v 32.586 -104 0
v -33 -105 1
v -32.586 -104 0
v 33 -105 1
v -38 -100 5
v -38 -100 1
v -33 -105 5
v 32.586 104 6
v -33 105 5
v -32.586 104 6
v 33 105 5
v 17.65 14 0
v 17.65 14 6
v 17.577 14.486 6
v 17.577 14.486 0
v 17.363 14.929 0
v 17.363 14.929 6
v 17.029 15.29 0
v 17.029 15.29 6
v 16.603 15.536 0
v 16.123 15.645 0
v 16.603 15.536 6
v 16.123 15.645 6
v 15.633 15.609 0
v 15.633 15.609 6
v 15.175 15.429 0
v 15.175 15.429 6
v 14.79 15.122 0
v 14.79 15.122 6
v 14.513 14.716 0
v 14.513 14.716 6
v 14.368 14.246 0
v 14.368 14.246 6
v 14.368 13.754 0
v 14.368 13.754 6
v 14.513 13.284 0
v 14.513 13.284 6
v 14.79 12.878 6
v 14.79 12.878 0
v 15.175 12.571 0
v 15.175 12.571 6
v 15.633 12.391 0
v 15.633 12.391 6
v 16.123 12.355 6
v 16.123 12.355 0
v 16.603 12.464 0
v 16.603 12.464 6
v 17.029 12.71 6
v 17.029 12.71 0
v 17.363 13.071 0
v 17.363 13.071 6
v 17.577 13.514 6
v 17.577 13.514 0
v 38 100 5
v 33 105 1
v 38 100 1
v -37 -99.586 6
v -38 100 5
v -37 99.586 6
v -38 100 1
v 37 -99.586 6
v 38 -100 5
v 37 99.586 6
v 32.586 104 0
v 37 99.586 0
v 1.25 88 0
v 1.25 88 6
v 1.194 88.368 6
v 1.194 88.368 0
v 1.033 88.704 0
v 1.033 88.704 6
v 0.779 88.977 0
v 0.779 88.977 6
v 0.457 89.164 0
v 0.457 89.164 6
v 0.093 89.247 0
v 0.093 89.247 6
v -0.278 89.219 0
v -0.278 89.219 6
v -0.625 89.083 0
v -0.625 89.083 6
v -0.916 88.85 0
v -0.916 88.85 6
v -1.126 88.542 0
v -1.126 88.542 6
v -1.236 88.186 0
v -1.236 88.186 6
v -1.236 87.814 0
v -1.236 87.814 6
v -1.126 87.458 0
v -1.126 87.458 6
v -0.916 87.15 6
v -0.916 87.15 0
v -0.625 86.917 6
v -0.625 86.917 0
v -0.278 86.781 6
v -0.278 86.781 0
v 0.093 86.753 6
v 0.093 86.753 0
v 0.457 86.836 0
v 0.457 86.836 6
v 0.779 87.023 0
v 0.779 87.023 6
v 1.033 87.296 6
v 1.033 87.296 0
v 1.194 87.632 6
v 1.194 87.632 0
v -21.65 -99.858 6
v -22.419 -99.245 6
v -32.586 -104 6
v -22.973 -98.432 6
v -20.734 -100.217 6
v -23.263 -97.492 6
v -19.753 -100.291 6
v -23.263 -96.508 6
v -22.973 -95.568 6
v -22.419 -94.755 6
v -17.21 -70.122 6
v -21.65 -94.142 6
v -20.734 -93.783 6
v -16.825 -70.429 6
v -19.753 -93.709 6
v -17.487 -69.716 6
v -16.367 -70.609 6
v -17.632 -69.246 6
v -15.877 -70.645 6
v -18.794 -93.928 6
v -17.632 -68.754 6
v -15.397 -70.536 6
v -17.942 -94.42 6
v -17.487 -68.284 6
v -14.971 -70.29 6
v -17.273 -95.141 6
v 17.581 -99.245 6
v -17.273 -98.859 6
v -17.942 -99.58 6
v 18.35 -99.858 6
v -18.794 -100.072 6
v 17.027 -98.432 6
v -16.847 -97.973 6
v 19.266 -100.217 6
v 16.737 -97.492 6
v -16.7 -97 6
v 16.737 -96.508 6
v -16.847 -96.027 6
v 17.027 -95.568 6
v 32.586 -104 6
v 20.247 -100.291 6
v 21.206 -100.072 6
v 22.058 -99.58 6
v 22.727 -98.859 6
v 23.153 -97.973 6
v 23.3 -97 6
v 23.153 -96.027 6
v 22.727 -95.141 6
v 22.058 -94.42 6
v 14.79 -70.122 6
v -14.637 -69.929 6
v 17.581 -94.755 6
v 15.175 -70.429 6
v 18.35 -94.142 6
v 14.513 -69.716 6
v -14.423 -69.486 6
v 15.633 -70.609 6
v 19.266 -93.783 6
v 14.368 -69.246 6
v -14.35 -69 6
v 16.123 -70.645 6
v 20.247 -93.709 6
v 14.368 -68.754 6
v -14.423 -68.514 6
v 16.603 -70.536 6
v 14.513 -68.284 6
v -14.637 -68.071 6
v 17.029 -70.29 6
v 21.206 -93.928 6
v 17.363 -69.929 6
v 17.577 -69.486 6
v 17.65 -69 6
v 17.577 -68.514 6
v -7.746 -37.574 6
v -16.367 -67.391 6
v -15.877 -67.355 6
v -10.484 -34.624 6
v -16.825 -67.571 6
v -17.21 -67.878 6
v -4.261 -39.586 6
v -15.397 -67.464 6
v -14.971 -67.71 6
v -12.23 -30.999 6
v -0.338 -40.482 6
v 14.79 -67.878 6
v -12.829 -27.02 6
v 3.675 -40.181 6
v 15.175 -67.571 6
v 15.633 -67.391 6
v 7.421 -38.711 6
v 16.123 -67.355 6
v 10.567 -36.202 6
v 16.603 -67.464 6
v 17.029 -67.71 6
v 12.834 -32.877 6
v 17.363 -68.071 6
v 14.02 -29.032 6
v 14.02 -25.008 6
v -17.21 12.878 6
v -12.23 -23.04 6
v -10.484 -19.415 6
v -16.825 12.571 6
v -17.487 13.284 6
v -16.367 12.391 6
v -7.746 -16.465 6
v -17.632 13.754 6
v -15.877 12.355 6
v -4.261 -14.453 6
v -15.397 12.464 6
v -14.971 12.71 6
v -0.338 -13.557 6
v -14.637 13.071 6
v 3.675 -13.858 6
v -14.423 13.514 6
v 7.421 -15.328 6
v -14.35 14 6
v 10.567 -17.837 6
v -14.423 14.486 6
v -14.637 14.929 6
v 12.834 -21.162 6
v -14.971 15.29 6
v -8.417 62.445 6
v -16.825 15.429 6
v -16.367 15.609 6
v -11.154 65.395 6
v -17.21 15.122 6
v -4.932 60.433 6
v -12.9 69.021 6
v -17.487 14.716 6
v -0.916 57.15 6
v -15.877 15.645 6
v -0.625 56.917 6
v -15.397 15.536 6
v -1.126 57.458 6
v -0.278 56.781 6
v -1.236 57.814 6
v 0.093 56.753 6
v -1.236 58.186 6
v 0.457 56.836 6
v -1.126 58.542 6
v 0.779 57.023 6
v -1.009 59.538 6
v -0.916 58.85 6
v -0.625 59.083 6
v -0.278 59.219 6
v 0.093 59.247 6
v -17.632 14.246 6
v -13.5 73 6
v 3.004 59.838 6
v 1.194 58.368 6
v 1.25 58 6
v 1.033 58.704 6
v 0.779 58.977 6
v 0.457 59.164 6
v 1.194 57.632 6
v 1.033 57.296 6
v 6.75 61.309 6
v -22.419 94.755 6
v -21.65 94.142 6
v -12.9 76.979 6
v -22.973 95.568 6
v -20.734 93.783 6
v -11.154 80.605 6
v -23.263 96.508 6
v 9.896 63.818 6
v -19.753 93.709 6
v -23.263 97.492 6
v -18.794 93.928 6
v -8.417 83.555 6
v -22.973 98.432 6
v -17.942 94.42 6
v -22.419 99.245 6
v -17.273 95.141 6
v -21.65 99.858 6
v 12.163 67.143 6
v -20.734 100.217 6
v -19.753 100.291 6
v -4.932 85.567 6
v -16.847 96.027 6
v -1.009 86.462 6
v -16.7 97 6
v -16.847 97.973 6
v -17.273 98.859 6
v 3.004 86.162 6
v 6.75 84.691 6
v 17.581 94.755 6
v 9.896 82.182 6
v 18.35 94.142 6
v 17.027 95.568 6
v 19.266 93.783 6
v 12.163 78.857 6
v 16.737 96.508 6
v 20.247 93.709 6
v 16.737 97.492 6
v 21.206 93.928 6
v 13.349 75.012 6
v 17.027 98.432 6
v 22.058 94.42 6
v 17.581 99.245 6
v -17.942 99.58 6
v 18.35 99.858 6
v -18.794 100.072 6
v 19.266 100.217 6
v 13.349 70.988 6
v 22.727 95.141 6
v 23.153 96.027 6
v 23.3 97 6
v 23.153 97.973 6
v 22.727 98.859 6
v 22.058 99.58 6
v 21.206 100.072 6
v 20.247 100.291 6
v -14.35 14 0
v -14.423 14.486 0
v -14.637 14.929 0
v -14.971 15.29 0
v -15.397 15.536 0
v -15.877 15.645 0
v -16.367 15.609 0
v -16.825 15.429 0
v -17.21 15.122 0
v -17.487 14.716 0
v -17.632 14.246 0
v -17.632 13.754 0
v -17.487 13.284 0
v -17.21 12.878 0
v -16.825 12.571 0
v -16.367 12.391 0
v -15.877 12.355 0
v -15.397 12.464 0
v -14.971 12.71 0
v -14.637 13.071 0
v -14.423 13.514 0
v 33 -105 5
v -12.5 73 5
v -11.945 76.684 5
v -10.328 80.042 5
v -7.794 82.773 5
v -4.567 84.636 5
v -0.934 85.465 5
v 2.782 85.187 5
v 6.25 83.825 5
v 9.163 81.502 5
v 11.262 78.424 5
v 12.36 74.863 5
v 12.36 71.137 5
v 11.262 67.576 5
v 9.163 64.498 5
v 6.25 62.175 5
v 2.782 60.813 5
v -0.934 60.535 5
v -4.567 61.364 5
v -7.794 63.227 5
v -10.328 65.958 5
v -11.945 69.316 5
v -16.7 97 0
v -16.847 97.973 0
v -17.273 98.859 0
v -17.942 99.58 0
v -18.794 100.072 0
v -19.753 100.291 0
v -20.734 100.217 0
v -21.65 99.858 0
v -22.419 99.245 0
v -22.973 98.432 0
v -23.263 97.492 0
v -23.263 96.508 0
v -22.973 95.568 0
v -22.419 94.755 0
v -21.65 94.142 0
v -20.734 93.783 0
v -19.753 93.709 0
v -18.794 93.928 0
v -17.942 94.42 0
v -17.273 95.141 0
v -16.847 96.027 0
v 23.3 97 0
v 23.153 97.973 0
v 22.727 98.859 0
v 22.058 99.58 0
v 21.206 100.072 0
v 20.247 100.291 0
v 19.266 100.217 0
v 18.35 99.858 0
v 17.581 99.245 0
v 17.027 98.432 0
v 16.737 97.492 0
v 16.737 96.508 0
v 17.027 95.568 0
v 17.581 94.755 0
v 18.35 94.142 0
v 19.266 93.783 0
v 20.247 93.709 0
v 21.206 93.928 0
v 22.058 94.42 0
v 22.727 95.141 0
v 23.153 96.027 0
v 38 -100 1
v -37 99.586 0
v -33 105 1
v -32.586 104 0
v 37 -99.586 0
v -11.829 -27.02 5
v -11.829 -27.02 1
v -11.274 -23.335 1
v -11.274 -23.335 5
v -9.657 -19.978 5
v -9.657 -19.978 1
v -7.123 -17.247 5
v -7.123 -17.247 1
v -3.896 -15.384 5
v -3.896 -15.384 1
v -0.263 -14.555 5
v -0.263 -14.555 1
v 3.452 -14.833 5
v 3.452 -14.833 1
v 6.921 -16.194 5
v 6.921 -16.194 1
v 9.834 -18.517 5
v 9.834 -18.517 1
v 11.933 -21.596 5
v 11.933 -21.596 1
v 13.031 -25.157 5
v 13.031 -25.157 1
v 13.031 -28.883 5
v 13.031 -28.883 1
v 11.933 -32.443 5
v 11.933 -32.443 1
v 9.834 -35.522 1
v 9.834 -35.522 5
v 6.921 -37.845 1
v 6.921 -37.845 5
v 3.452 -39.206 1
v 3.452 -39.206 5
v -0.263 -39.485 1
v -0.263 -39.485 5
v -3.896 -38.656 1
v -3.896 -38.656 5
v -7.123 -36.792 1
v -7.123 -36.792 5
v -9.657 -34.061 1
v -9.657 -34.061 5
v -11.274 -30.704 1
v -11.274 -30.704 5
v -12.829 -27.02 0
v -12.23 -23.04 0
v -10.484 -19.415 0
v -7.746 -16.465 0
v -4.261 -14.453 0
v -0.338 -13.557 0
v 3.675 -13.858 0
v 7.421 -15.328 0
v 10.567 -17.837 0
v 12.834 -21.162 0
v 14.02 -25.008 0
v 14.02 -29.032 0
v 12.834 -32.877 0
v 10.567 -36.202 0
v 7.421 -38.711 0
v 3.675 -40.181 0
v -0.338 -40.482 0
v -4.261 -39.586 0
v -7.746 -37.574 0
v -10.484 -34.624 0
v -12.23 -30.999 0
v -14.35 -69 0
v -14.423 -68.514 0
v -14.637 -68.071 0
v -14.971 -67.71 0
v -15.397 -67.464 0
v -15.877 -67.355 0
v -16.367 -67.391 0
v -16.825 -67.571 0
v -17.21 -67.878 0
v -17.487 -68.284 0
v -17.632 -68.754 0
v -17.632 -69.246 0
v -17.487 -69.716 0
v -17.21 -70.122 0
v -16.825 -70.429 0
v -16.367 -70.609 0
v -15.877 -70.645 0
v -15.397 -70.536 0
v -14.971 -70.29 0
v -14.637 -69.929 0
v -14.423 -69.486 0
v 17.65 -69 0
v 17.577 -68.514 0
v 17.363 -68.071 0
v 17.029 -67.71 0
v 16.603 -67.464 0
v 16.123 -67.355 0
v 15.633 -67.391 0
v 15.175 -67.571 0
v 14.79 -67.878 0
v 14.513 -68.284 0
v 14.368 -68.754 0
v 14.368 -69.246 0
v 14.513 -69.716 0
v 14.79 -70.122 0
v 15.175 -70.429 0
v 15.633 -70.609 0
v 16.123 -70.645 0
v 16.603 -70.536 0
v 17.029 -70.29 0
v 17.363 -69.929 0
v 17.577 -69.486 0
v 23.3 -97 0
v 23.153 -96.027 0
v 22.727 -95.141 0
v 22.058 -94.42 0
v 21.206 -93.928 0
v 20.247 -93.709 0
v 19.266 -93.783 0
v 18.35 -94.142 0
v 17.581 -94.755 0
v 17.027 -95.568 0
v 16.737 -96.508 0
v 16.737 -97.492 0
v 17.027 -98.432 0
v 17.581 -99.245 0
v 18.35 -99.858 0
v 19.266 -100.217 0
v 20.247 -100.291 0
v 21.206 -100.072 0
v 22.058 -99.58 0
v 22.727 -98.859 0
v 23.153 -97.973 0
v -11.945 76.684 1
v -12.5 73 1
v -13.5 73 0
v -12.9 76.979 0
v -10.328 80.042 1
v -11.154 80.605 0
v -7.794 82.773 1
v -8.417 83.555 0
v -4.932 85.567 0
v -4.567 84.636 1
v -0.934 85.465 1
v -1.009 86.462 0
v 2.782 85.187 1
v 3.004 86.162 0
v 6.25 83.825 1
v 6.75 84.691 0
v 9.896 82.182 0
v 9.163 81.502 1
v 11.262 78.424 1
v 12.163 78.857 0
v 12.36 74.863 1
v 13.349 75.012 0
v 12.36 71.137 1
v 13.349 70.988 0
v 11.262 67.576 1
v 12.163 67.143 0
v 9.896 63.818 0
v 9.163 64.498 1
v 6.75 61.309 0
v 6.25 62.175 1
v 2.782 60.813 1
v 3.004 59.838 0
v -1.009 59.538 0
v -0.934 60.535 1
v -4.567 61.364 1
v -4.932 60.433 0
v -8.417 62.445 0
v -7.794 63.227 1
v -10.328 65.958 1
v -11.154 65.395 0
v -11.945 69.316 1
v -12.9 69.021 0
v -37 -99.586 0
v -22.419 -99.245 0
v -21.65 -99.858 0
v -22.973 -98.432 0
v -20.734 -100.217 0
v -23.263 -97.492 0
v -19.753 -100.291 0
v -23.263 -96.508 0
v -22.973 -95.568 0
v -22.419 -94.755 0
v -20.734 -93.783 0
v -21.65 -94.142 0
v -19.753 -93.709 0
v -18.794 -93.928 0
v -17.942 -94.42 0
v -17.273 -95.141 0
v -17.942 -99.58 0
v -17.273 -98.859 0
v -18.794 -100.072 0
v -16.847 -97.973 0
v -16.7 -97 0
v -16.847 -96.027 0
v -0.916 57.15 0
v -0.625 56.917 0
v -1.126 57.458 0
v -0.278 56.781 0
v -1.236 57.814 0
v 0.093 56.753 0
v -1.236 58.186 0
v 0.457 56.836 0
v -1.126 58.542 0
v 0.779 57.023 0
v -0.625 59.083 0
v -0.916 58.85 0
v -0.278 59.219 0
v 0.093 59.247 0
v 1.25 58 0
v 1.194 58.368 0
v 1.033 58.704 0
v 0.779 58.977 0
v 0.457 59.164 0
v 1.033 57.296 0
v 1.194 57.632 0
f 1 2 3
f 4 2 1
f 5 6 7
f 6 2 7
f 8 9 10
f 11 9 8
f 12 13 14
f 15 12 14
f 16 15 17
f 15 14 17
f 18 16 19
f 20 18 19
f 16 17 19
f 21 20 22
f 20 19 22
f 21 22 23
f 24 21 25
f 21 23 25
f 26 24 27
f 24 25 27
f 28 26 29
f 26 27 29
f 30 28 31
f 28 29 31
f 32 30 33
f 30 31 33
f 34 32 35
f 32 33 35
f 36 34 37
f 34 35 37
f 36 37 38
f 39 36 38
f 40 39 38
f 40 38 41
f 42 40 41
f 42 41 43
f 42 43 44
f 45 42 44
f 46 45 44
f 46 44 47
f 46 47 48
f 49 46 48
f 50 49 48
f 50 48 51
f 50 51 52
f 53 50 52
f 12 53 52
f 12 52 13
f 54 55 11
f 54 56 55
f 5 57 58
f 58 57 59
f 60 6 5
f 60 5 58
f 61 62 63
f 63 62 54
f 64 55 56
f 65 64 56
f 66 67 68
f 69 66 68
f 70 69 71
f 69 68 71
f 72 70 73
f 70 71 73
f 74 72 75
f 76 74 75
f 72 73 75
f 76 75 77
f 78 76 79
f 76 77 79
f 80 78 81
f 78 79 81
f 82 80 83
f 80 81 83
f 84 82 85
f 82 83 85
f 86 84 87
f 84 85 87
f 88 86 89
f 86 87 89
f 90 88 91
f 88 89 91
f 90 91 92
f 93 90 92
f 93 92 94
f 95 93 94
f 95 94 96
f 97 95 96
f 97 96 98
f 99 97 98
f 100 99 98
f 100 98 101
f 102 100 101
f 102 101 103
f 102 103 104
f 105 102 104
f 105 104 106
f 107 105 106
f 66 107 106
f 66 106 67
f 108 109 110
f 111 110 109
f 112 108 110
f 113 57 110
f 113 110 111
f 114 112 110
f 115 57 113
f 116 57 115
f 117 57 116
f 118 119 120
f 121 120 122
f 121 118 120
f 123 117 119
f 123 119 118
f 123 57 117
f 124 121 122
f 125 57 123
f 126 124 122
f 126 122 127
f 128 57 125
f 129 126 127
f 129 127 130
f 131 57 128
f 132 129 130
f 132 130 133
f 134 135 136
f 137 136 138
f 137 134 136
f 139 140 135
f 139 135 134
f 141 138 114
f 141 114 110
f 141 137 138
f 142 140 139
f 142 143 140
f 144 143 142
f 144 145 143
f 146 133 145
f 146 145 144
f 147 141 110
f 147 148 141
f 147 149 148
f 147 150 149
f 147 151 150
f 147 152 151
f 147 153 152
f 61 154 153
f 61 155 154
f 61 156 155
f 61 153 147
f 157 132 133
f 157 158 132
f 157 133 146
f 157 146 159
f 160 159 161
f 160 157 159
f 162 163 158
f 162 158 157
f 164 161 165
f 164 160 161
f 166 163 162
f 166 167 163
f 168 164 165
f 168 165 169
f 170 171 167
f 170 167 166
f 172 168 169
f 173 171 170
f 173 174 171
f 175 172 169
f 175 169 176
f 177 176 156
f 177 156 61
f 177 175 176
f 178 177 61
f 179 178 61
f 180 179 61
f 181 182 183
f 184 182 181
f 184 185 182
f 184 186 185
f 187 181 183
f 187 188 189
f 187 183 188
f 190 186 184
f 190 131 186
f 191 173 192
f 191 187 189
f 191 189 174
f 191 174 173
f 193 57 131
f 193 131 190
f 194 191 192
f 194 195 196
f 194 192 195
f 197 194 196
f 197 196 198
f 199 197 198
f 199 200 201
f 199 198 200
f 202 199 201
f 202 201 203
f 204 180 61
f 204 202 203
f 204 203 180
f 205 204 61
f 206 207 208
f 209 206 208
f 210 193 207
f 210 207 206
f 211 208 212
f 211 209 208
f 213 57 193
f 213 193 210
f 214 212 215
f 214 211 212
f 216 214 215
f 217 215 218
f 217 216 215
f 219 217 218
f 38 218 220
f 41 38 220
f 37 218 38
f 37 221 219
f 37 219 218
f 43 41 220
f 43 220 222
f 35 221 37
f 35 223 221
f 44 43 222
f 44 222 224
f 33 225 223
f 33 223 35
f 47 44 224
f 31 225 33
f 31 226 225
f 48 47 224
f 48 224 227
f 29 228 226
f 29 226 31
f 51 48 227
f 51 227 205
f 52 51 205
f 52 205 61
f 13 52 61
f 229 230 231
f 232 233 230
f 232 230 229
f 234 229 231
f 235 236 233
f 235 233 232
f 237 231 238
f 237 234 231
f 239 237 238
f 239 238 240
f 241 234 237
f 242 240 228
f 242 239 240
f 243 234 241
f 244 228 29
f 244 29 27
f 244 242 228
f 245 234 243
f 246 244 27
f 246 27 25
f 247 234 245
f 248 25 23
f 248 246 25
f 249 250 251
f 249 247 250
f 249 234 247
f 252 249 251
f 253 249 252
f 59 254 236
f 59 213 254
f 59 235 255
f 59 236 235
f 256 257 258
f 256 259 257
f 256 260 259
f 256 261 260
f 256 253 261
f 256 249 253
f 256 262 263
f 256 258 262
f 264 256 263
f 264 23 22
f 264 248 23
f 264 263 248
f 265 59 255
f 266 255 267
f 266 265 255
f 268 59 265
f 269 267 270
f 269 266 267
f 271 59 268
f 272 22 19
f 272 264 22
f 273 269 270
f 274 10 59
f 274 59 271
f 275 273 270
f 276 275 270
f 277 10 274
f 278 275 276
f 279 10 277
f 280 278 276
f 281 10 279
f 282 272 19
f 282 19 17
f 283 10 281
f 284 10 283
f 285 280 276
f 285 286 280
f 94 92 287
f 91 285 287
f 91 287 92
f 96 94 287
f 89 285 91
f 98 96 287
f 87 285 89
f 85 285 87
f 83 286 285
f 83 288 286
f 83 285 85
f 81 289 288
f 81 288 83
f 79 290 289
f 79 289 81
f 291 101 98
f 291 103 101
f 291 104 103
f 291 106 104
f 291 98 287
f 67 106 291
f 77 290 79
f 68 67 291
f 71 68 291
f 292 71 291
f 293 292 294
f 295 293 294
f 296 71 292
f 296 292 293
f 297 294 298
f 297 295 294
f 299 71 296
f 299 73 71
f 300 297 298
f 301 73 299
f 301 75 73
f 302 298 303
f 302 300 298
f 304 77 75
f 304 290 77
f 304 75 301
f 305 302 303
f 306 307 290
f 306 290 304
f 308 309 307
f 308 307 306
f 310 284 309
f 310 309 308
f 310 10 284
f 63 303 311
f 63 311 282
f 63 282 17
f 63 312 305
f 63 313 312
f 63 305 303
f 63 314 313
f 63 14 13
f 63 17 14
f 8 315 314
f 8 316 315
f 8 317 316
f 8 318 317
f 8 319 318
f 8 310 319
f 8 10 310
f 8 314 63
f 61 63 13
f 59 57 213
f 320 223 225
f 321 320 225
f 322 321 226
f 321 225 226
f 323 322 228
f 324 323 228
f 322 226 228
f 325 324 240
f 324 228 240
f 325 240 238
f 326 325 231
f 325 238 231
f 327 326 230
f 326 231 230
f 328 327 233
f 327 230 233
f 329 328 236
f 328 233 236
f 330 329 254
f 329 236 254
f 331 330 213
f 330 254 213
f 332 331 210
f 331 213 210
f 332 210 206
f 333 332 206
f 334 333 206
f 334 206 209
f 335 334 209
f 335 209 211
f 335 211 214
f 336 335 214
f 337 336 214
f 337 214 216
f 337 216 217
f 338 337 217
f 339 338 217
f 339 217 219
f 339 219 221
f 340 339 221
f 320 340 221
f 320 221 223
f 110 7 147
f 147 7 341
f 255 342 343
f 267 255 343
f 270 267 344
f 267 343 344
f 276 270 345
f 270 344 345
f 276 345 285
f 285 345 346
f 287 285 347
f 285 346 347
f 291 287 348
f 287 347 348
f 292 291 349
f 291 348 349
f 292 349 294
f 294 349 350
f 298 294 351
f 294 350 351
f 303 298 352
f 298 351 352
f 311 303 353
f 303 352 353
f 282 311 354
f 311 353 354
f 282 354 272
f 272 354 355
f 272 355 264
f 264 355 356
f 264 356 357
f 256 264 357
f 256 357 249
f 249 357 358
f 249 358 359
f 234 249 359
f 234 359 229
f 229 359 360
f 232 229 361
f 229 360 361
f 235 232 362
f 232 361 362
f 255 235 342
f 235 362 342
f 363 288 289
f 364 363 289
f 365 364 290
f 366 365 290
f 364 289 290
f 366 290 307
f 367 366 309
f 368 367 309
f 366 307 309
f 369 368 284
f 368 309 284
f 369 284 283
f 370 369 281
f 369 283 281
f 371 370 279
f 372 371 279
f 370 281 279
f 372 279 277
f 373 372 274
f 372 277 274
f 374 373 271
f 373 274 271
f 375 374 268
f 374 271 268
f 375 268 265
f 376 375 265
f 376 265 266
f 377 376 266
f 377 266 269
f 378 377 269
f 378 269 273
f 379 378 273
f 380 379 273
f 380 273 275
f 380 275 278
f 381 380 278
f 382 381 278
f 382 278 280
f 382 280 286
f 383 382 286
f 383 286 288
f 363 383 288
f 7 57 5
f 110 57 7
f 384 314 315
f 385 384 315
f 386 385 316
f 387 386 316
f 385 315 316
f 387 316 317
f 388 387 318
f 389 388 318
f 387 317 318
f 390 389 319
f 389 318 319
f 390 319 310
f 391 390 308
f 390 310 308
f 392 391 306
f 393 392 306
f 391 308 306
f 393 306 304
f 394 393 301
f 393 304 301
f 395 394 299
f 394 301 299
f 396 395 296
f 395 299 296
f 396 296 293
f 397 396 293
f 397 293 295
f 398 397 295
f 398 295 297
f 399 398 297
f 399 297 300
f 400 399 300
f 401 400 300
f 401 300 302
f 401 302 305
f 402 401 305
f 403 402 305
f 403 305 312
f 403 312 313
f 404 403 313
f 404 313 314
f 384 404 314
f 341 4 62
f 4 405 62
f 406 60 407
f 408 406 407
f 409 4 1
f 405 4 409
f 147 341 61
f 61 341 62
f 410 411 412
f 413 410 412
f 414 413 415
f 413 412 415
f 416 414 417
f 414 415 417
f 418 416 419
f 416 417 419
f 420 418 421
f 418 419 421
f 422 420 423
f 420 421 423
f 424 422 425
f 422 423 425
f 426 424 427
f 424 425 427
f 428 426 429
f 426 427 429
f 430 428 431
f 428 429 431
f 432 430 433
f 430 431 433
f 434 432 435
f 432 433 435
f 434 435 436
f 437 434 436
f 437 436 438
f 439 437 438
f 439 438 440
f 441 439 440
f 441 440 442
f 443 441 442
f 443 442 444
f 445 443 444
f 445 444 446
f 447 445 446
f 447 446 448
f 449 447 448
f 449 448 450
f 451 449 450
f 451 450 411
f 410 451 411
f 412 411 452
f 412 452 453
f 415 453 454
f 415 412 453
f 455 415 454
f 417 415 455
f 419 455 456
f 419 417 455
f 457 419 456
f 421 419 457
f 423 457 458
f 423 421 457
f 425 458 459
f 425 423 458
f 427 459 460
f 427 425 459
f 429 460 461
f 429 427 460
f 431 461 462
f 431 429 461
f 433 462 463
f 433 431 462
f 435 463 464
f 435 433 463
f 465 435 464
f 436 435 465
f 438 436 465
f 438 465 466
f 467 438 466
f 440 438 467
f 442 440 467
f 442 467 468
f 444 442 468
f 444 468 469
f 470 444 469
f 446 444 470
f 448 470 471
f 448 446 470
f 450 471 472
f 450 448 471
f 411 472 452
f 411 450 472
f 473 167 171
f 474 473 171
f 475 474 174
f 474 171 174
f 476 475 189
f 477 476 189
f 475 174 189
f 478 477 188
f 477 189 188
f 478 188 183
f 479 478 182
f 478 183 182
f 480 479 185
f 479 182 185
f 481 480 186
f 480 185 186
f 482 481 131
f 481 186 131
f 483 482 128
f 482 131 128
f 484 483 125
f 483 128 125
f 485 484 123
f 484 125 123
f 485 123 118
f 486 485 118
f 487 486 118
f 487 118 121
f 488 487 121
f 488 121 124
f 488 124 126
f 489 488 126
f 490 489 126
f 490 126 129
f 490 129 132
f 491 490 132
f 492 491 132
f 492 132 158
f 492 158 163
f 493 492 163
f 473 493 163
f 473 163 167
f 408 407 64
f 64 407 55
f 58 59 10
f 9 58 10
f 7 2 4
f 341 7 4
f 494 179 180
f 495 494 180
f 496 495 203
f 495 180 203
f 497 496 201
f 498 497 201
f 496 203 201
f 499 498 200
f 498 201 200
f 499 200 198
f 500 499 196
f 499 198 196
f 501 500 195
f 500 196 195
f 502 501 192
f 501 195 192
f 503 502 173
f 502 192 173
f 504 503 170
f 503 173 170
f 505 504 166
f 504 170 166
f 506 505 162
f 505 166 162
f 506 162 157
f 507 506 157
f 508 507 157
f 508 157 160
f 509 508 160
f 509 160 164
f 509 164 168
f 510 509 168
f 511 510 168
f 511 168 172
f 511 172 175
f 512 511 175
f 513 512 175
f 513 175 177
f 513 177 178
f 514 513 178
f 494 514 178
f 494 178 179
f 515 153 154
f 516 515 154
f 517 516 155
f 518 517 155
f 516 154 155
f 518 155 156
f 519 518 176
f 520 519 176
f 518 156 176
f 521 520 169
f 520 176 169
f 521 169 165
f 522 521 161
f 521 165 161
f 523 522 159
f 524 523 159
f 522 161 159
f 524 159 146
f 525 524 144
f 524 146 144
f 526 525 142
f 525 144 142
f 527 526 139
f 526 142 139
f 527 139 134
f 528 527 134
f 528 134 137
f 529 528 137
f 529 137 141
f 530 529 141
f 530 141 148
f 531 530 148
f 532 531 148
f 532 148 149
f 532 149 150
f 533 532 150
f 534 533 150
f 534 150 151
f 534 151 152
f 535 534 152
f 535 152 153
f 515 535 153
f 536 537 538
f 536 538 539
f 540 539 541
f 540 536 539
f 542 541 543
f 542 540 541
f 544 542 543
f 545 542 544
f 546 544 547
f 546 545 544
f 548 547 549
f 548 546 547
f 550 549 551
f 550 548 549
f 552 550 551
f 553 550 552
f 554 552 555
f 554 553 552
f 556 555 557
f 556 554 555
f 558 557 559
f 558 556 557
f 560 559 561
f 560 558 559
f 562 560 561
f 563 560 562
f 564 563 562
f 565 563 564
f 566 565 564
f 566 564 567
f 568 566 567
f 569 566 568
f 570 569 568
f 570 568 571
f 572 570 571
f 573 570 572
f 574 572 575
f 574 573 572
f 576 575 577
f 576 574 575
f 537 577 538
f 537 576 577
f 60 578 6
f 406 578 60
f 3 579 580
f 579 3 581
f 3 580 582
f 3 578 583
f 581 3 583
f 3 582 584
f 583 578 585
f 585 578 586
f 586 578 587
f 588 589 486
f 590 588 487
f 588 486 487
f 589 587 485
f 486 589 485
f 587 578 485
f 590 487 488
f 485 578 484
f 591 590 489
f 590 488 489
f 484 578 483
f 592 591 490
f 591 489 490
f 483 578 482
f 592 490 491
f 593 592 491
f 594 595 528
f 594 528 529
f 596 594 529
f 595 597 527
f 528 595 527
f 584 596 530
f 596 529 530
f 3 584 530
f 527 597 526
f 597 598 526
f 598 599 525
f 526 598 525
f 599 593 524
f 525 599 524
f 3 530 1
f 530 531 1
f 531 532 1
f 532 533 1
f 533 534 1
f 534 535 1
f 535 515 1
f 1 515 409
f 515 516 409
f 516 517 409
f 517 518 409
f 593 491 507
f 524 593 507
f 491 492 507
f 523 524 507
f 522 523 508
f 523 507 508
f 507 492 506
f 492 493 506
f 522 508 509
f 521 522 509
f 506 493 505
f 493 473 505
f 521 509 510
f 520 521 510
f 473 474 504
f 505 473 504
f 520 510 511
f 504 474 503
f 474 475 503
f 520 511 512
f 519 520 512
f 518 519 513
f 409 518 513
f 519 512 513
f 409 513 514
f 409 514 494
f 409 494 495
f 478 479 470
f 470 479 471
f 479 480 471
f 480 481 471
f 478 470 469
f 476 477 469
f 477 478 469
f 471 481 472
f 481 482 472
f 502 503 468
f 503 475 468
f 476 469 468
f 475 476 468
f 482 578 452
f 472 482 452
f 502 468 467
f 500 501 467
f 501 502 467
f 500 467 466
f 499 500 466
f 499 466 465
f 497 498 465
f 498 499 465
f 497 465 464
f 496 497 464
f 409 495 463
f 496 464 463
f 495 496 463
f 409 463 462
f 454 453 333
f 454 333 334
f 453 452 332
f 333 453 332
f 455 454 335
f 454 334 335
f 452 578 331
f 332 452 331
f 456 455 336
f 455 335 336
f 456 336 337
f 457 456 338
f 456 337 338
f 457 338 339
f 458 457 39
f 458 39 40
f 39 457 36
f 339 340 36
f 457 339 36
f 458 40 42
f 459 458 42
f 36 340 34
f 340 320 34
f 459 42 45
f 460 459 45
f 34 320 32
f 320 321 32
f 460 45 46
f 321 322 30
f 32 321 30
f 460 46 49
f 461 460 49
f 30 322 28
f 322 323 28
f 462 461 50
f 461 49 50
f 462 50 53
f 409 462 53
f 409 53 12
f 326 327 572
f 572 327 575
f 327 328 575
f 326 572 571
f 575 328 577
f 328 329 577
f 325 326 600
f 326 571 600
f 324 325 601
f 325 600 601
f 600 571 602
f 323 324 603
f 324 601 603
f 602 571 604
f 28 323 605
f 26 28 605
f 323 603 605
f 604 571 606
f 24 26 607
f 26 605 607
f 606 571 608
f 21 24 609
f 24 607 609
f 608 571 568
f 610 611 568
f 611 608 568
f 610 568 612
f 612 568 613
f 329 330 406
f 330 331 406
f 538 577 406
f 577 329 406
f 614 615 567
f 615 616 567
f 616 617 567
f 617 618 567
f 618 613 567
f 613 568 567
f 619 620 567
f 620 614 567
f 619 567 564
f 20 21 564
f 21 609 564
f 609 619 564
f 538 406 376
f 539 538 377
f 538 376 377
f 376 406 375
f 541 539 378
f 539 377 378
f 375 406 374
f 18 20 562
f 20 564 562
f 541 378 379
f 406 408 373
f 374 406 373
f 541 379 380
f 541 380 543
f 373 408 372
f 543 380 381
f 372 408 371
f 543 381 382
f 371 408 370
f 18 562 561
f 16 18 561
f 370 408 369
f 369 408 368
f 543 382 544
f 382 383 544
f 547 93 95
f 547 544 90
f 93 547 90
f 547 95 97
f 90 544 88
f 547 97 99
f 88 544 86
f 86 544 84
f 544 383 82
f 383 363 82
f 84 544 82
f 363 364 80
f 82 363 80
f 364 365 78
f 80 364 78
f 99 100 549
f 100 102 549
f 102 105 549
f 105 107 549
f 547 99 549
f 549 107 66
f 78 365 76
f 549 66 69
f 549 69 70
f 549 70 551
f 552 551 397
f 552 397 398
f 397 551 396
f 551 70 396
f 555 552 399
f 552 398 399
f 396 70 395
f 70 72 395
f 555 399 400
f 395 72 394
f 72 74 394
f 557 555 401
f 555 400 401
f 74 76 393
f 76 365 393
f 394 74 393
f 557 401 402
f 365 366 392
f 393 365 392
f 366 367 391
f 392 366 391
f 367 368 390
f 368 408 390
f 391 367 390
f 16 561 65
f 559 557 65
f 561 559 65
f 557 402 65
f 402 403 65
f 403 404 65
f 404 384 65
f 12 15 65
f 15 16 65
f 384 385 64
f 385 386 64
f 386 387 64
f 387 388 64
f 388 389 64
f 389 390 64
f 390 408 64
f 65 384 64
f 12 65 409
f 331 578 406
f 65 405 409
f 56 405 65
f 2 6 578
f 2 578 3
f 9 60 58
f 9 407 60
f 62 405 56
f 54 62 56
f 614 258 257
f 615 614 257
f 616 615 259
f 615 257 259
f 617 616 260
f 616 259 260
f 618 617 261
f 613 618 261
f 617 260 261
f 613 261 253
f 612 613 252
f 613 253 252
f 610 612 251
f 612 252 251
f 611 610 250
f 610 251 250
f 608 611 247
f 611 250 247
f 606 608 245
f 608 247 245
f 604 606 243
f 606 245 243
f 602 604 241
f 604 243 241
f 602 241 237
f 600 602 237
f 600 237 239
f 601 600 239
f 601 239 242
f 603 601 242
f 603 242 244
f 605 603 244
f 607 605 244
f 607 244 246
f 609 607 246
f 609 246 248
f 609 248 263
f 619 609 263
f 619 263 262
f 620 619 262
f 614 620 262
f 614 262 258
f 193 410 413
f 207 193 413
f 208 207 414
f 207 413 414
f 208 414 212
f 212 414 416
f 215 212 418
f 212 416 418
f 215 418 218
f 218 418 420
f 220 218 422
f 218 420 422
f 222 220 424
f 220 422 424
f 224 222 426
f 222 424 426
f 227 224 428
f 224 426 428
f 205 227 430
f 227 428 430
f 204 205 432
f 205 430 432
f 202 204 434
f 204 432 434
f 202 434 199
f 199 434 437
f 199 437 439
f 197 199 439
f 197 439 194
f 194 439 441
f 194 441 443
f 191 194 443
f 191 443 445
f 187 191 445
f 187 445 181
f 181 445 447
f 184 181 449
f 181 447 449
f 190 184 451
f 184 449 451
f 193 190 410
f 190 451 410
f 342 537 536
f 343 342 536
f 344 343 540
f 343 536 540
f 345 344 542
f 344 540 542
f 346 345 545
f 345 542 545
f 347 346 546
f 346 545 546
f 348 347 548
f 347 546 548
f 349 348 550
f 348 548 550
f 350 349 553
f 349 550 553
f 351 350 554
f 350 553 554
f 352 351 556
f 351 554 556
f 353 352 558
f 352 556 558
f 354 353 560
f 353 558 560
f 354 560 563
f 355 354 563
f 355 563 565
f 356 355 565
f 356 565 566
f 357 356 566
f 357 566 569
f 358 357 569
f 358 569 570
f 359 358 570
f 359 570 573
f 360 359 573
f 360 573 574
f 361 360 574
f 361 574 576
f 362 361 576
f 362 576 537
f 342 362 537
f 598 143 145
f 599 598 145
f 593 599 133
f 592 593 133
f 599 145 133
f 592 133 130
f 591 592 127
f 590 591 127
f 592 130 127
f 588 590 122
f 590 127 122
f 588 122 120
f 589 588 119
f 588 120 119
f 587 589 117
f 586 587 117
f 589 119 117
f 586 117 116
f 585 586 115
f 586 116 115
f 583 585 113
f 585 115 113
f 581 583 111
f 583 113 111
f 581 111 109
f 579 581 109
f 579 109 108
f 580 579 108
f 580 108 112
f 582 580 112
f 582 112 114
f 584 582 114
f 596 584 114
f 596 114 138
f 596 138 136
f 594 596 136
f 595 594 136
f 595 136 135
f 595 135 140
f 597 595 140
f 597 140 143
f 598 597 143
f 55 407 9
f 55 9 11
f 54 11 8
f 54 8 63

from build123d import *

# Parameters (mm, degrees)
SKETCH_1_W             = 76
SKETCH_1_H             = 210
EXTRUDE_1_DEPTH        = 6
SKETCH_2_R             = 3.3
CUT_EXTRUDE_1_DEPTH    = 112.825757319
CHAMFER_2_SIZE         = 5
CHAMFER_1_SIZE         = 1
HOLE_WIZARD_M4_1_D     = 3.3
HOLE_WIZARD_M4_1_DEPTH = 10.1
HOLE_WIZARD_M4_1_TIP   = 0.991420021
HOLE_WIZARD_M3_1_D     = 2.5
HOLE_WIZARD_M3_1_DEPTH = 7.5
HOLE_WIZARD_M3_1_TIP   = 0.751075774
SKETCH_7_R             = 12.5
CUT_EXTRUDE_2_DEPTH    = 112.825757319
SKETCH_8_R             = 12.5
CUT_EXTRUDE_3_DEPTH    = 112.825757319
CHAMFER_3_SIZE         = 1


with BuildPart() as part:
    # 草图1 → 凸台-拉伸1 (new body)
    with BuildSketch(Plane.XY):
        Rectangle(SKETCH_1_W, SKETCH_1_H)
    extrude(amount=EXTRUDE_1_DEPTH)

    # 草图2 → 切除-拉伸1 (cut, through all)
    with BuildSketch(Plane.XY.offset(6)):
        with Locations((-20, 97)):
            Circle(SKETCH_2_R)
        with Locations((20, 97)):
            Circle(SKETCH_2_R)
        with Locations((-20, -97)):
            Circle(SKETCH_2_R)
        with Locations((20, -97)):
            Circle(SKETCH_2_R)
    extrude(amount=-CUT_EXTRUDE_1_DEPTH, mode=Mode.SUBTRACT)

    # 倒角2
    chamfer_2_edges = [part.edges().sort_by_distance(p)[0] for p in [
        (38, -105, 3),
        (-38, -105, 3),
        (-38, 105, 3),
        (38, 105, 3),
    ]]
    chamfer(chamfer_2_edges, length=CHAMFER_2_SIZE)

    # 倒角1
    chamfer_1_edges = [part.edges().sort_by_distance(p)[0] for p in [
        (0, -105, 0),
        (0, -105, 6),
        (38, 0, 0),
        (-38, 0, 0),
        (0, 105, 0),
        (35.5, 102.5, 0),
        (-35.5, 102.5, 0),
        (35.5, -102.5, 0),
        (-35.5, -102.5, 0),
        (-38, 0, 6),
        (38, 0, 6),
        (0, 105, 6),
        (35.5, 102.5, 6),
        (-35.5, 102.5, 6),
        (35.5, -102.5, 6),
        (-35.5, -102.5, 6),
    ]]
    chamfer(chamfer_1_edges, length=CHAMFER_1_SIZE)

    # M4 螺纹孔1
    with Locations(Plane(origin=(0, 0, 0), x_dir=(-1, 0, 0), z_dir=(0, 0, -1))):
        with Locations((-16, 14), (16, 14), (16, -69), (-16, -69)):
            Hole(HOLE_WIZARD_M4_1_D / 2, depth=HOLE_WIZARD_M4_1_DEPTH)
            with Locations((0, 0, -(HOLE_WIZARD_M4_1_DEPTH + HOLE_WIZARD_M4_1_TIP / 2))):  # 118° drill point
                Cone(0, HOLE_WIZARD_M4_1_D / 2, HOLE_WIZARD_M4_1_TIP, mode=Mode.SUBTRACT)

    # M3 螺纹孔1
    with Locations(Plane(origin=(0, 0, 0), x_dir=(-1, 0, 0), z_dir=(0, 0, -1))):
        with Locations((0, 58), (0, 88)):
            Hole(HOLE_WIZARD_M3_1_D / 2, depth=HOLE_WIZARD_M3_1_DEPTH)
            with Locations((0, 0, -(HOLE_WIZARD_M3_1_DEPTH + HOLE_WIZARD_M3_1_TIP / 2))):  # 118° drill point
                Cone(0, HOLE_WIZARD_M3_1_D / 2, HOLE_WIZARD_M3_1_TIP, mode=Mode.SUBTRACT)

    # 草图7 → 切除-拉伸2 (cut, through all)
    with BuildSketch(Plane(origin=(0, 0, 0), x_dir=(-1, 0, 0), z_dir=(0, 0, -1))):
        with Locations((0, 73)):
            Circle(SKETCH_7_R)
    extrude(amount=-CUT_EXTRUDE_2_DEPTH, mode=Mode.SUBTRACT)

    # 草图8 → 切除-拉伸3 (cut, through all)
    with BuildSketch(Plane(origin=(0, 0, 0), x_dir=(-1, 0, 0), z_dir=(0, 0, -1))):
        with Locations((-0.670705331, -27.019604997)):
            Circle(SKETCH_8_R)
    extrude(amount=-CUT_EXTRUDE_3_DEPTH, mode=Mode.SUBTRACT)

    # 倒角3
    chamfer_3_edges = [part.edges().sort_by_distance(p)[0] for p in [
        (12.5, 73, 6),
        (12.5, 73, 0),
        (13.170705331, -27.019604997, 6),
        (13.170705331, -27.019604997, 0),
    ]]
    chamfer(chamfer_3_edges, length=CHAMFER_3_SIZE)


solid = part.part
